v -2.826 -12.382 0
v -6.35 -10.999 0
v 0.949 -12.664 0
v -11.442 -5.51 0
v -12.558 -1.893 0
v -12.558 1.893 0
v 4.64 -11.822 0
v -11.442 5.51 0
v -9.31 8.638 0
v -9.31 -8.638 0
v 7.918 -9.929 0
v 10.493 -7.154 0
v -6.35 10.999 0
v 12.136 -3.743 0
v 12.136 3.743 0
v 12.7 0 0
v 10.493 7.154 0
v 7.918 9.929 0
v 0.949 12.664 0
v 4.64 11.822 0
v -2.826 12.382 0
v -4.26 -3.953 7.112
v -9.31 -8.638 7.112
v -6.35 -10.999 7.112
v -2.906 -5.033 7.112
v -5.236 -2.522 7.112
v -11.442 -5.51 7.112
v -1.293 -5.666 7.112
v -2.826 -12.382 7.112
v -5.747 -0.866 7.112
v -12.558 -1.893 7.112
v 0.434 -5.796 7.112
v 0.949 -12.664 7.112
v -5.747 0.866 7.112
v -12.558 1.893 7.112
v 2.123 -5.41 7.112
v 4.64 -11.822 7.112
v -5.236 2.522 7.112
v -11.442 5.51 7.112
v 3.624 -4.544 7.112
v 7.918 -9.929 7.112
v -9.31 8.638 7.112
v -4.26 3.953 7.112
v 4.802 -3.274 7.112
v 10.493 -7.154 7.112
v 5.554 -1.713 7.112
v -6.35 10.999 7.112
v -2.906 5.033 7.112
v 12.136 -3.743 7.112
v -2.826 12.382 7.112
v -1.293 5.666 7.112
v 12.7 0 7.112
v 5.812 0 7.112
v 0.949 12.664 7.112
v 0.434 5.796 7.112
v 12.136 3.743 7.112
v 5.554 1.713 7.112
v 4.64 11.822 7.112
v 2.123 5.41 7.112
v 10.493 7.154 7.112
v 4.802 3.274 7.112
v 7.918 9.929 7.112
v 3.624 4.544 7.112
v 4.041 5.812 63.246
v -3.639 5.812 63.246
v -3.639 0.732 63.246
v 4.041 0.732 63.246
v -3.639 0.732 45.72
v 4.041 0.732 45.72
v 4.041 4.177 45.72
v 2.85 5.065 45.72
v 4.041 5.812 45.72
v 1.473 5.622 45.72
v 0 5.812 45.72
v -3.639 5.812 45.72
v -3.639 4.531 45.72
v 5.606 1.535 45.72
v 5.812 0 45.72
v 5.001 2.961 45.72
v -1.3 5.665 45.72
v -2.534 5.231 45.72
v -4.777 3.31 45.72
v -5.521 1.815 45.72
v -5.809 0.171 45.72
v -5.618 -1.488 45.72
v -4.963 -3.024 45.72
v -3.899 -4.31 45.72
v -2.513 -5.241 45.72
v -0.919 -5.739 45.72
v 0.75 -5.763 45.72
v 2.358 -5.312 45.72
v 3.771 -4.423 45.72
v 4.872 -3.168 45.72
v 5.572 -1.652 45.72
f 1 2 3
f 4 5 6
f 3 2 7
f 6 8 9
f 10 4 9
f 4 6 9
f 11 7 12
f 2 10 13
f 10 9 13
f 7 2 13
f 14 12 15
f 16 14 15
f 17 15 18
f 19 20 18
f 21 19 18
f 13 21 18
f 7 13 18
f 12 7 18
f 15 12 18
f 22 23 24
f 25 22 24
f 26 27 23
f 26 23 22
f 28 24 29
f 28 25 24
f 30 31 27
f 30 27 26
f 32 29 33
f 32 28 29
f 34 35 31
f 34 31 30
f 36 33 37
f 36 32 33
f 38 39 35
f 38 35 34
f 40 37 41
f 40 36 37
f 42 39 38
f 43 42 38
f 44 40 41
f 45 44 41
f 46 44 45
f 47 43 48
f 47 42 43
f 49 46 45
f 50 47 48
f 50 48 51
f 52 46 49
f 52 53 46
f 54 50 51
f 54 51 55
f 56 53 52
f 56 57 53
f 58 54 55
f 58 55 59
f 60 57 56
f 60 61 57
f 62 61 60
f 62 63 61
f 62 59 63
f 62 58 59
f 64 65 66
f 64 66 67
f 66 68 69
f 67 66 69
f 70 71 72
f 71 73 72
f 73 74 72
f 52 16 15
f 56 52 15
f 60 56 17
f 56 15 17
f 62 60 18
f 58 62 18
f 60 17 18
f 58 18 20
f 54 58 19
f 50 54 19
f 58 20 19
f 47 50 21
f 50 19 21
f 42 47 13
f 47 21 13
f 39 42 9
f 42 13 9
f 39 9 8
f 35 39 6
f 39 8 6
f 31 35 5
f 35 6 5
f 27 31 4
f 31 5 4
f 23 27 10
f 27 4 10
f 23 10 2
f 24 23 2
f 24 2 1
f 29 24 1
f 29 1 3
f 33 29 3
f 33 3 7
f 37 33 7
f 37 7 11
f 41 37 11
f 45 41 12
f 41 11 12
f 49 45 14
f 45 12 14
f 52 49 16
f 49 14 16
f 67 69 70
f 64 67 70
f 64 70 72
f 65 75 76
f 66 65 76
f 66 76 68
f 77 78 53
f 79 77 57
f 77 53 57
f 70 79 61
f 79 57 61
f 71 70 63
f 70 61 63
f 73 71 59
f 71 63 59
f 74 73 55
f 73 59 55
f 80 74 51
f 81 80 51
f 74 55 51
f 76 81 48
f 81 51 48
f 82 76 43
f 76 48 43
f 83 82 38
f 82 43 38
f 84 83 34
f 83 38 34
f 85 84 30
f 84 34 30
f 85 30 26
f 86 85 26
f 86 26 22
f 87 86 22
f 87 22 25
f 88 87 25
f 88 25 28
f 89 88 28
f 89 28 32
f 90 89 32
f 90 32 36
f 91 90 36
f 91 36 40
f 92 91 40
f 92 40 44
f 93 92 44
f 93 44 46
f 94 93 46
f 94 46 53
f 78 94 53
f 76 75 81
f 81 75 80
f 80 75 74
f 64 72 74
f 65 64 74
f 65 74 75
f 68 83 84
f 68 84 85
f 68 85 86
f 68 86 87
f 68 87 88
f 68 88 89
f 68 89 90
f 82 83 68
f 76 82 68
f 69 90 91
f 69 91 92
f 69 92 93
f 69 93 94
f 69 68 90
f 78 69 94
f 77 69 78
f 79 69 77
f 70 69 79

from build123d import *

# Parameters (mm, degrees)
F0_R     = 12.7
F1_DEPTH = 7.112
F2_R     = 5.811931
F3_DEPTH = 38.608
F5_DEPTH = 17.526


with BuildPart() as f1:
    # F0 (on Top) → F1 (new body)
    with BuildSketch(Plane.XY):
        Circle(F0_R)
    extrude(amount=F1_DEPTH)

    # F2 (on face) → F3 (join)
    with BuildSketch(Plane.XY.offset(7.112)):
        Circle(F2_R)
    extrude(amount=F3_DEPTH)

    # F4 (on face) → F5 (join)
    with BuildSketch(Plane.XY.offset(45.72)):
        with BuildLine():
            ThreePointArc((4.041356, 4.176839), (2.179798, 5.387673), (0, 5.811931))
            ThreePointArc((0, 5.811931), (-1.928979, 5.482479), (-3.639269, 4.531475))
            Line((-3.639269, 4.531475), (-3.639269, 0.731931))
            Line((-3.639269, 0.731931), (4.041356, 0.731931))
            Line((4.041356, 0.731931), (4.041356, 4.176839))
        make_face()
        with BuildLine():
            ThreePointArc((-3.639269, 4.531475), (-1.928979, 5.482479), (0, 5.811931))
            Line((0, 5.811931), (-3.639269, 5.811931))
            Line((-3.639269, 5.811931), (-3.639269, 4.531475))
        make_face()
        with BuildLine():
            Line((4.041356, 4.176839), (4.041356, 5.811931))
            Line((4.041356, 5.811931), (0, 5.811931))
            ThreePointArc((0, 5.811931), (2.179798, 5.387673), (4.041356, 4.176839))
        make_face()
    extrude(amount=F5_DEPTH)


solid = f1.part
